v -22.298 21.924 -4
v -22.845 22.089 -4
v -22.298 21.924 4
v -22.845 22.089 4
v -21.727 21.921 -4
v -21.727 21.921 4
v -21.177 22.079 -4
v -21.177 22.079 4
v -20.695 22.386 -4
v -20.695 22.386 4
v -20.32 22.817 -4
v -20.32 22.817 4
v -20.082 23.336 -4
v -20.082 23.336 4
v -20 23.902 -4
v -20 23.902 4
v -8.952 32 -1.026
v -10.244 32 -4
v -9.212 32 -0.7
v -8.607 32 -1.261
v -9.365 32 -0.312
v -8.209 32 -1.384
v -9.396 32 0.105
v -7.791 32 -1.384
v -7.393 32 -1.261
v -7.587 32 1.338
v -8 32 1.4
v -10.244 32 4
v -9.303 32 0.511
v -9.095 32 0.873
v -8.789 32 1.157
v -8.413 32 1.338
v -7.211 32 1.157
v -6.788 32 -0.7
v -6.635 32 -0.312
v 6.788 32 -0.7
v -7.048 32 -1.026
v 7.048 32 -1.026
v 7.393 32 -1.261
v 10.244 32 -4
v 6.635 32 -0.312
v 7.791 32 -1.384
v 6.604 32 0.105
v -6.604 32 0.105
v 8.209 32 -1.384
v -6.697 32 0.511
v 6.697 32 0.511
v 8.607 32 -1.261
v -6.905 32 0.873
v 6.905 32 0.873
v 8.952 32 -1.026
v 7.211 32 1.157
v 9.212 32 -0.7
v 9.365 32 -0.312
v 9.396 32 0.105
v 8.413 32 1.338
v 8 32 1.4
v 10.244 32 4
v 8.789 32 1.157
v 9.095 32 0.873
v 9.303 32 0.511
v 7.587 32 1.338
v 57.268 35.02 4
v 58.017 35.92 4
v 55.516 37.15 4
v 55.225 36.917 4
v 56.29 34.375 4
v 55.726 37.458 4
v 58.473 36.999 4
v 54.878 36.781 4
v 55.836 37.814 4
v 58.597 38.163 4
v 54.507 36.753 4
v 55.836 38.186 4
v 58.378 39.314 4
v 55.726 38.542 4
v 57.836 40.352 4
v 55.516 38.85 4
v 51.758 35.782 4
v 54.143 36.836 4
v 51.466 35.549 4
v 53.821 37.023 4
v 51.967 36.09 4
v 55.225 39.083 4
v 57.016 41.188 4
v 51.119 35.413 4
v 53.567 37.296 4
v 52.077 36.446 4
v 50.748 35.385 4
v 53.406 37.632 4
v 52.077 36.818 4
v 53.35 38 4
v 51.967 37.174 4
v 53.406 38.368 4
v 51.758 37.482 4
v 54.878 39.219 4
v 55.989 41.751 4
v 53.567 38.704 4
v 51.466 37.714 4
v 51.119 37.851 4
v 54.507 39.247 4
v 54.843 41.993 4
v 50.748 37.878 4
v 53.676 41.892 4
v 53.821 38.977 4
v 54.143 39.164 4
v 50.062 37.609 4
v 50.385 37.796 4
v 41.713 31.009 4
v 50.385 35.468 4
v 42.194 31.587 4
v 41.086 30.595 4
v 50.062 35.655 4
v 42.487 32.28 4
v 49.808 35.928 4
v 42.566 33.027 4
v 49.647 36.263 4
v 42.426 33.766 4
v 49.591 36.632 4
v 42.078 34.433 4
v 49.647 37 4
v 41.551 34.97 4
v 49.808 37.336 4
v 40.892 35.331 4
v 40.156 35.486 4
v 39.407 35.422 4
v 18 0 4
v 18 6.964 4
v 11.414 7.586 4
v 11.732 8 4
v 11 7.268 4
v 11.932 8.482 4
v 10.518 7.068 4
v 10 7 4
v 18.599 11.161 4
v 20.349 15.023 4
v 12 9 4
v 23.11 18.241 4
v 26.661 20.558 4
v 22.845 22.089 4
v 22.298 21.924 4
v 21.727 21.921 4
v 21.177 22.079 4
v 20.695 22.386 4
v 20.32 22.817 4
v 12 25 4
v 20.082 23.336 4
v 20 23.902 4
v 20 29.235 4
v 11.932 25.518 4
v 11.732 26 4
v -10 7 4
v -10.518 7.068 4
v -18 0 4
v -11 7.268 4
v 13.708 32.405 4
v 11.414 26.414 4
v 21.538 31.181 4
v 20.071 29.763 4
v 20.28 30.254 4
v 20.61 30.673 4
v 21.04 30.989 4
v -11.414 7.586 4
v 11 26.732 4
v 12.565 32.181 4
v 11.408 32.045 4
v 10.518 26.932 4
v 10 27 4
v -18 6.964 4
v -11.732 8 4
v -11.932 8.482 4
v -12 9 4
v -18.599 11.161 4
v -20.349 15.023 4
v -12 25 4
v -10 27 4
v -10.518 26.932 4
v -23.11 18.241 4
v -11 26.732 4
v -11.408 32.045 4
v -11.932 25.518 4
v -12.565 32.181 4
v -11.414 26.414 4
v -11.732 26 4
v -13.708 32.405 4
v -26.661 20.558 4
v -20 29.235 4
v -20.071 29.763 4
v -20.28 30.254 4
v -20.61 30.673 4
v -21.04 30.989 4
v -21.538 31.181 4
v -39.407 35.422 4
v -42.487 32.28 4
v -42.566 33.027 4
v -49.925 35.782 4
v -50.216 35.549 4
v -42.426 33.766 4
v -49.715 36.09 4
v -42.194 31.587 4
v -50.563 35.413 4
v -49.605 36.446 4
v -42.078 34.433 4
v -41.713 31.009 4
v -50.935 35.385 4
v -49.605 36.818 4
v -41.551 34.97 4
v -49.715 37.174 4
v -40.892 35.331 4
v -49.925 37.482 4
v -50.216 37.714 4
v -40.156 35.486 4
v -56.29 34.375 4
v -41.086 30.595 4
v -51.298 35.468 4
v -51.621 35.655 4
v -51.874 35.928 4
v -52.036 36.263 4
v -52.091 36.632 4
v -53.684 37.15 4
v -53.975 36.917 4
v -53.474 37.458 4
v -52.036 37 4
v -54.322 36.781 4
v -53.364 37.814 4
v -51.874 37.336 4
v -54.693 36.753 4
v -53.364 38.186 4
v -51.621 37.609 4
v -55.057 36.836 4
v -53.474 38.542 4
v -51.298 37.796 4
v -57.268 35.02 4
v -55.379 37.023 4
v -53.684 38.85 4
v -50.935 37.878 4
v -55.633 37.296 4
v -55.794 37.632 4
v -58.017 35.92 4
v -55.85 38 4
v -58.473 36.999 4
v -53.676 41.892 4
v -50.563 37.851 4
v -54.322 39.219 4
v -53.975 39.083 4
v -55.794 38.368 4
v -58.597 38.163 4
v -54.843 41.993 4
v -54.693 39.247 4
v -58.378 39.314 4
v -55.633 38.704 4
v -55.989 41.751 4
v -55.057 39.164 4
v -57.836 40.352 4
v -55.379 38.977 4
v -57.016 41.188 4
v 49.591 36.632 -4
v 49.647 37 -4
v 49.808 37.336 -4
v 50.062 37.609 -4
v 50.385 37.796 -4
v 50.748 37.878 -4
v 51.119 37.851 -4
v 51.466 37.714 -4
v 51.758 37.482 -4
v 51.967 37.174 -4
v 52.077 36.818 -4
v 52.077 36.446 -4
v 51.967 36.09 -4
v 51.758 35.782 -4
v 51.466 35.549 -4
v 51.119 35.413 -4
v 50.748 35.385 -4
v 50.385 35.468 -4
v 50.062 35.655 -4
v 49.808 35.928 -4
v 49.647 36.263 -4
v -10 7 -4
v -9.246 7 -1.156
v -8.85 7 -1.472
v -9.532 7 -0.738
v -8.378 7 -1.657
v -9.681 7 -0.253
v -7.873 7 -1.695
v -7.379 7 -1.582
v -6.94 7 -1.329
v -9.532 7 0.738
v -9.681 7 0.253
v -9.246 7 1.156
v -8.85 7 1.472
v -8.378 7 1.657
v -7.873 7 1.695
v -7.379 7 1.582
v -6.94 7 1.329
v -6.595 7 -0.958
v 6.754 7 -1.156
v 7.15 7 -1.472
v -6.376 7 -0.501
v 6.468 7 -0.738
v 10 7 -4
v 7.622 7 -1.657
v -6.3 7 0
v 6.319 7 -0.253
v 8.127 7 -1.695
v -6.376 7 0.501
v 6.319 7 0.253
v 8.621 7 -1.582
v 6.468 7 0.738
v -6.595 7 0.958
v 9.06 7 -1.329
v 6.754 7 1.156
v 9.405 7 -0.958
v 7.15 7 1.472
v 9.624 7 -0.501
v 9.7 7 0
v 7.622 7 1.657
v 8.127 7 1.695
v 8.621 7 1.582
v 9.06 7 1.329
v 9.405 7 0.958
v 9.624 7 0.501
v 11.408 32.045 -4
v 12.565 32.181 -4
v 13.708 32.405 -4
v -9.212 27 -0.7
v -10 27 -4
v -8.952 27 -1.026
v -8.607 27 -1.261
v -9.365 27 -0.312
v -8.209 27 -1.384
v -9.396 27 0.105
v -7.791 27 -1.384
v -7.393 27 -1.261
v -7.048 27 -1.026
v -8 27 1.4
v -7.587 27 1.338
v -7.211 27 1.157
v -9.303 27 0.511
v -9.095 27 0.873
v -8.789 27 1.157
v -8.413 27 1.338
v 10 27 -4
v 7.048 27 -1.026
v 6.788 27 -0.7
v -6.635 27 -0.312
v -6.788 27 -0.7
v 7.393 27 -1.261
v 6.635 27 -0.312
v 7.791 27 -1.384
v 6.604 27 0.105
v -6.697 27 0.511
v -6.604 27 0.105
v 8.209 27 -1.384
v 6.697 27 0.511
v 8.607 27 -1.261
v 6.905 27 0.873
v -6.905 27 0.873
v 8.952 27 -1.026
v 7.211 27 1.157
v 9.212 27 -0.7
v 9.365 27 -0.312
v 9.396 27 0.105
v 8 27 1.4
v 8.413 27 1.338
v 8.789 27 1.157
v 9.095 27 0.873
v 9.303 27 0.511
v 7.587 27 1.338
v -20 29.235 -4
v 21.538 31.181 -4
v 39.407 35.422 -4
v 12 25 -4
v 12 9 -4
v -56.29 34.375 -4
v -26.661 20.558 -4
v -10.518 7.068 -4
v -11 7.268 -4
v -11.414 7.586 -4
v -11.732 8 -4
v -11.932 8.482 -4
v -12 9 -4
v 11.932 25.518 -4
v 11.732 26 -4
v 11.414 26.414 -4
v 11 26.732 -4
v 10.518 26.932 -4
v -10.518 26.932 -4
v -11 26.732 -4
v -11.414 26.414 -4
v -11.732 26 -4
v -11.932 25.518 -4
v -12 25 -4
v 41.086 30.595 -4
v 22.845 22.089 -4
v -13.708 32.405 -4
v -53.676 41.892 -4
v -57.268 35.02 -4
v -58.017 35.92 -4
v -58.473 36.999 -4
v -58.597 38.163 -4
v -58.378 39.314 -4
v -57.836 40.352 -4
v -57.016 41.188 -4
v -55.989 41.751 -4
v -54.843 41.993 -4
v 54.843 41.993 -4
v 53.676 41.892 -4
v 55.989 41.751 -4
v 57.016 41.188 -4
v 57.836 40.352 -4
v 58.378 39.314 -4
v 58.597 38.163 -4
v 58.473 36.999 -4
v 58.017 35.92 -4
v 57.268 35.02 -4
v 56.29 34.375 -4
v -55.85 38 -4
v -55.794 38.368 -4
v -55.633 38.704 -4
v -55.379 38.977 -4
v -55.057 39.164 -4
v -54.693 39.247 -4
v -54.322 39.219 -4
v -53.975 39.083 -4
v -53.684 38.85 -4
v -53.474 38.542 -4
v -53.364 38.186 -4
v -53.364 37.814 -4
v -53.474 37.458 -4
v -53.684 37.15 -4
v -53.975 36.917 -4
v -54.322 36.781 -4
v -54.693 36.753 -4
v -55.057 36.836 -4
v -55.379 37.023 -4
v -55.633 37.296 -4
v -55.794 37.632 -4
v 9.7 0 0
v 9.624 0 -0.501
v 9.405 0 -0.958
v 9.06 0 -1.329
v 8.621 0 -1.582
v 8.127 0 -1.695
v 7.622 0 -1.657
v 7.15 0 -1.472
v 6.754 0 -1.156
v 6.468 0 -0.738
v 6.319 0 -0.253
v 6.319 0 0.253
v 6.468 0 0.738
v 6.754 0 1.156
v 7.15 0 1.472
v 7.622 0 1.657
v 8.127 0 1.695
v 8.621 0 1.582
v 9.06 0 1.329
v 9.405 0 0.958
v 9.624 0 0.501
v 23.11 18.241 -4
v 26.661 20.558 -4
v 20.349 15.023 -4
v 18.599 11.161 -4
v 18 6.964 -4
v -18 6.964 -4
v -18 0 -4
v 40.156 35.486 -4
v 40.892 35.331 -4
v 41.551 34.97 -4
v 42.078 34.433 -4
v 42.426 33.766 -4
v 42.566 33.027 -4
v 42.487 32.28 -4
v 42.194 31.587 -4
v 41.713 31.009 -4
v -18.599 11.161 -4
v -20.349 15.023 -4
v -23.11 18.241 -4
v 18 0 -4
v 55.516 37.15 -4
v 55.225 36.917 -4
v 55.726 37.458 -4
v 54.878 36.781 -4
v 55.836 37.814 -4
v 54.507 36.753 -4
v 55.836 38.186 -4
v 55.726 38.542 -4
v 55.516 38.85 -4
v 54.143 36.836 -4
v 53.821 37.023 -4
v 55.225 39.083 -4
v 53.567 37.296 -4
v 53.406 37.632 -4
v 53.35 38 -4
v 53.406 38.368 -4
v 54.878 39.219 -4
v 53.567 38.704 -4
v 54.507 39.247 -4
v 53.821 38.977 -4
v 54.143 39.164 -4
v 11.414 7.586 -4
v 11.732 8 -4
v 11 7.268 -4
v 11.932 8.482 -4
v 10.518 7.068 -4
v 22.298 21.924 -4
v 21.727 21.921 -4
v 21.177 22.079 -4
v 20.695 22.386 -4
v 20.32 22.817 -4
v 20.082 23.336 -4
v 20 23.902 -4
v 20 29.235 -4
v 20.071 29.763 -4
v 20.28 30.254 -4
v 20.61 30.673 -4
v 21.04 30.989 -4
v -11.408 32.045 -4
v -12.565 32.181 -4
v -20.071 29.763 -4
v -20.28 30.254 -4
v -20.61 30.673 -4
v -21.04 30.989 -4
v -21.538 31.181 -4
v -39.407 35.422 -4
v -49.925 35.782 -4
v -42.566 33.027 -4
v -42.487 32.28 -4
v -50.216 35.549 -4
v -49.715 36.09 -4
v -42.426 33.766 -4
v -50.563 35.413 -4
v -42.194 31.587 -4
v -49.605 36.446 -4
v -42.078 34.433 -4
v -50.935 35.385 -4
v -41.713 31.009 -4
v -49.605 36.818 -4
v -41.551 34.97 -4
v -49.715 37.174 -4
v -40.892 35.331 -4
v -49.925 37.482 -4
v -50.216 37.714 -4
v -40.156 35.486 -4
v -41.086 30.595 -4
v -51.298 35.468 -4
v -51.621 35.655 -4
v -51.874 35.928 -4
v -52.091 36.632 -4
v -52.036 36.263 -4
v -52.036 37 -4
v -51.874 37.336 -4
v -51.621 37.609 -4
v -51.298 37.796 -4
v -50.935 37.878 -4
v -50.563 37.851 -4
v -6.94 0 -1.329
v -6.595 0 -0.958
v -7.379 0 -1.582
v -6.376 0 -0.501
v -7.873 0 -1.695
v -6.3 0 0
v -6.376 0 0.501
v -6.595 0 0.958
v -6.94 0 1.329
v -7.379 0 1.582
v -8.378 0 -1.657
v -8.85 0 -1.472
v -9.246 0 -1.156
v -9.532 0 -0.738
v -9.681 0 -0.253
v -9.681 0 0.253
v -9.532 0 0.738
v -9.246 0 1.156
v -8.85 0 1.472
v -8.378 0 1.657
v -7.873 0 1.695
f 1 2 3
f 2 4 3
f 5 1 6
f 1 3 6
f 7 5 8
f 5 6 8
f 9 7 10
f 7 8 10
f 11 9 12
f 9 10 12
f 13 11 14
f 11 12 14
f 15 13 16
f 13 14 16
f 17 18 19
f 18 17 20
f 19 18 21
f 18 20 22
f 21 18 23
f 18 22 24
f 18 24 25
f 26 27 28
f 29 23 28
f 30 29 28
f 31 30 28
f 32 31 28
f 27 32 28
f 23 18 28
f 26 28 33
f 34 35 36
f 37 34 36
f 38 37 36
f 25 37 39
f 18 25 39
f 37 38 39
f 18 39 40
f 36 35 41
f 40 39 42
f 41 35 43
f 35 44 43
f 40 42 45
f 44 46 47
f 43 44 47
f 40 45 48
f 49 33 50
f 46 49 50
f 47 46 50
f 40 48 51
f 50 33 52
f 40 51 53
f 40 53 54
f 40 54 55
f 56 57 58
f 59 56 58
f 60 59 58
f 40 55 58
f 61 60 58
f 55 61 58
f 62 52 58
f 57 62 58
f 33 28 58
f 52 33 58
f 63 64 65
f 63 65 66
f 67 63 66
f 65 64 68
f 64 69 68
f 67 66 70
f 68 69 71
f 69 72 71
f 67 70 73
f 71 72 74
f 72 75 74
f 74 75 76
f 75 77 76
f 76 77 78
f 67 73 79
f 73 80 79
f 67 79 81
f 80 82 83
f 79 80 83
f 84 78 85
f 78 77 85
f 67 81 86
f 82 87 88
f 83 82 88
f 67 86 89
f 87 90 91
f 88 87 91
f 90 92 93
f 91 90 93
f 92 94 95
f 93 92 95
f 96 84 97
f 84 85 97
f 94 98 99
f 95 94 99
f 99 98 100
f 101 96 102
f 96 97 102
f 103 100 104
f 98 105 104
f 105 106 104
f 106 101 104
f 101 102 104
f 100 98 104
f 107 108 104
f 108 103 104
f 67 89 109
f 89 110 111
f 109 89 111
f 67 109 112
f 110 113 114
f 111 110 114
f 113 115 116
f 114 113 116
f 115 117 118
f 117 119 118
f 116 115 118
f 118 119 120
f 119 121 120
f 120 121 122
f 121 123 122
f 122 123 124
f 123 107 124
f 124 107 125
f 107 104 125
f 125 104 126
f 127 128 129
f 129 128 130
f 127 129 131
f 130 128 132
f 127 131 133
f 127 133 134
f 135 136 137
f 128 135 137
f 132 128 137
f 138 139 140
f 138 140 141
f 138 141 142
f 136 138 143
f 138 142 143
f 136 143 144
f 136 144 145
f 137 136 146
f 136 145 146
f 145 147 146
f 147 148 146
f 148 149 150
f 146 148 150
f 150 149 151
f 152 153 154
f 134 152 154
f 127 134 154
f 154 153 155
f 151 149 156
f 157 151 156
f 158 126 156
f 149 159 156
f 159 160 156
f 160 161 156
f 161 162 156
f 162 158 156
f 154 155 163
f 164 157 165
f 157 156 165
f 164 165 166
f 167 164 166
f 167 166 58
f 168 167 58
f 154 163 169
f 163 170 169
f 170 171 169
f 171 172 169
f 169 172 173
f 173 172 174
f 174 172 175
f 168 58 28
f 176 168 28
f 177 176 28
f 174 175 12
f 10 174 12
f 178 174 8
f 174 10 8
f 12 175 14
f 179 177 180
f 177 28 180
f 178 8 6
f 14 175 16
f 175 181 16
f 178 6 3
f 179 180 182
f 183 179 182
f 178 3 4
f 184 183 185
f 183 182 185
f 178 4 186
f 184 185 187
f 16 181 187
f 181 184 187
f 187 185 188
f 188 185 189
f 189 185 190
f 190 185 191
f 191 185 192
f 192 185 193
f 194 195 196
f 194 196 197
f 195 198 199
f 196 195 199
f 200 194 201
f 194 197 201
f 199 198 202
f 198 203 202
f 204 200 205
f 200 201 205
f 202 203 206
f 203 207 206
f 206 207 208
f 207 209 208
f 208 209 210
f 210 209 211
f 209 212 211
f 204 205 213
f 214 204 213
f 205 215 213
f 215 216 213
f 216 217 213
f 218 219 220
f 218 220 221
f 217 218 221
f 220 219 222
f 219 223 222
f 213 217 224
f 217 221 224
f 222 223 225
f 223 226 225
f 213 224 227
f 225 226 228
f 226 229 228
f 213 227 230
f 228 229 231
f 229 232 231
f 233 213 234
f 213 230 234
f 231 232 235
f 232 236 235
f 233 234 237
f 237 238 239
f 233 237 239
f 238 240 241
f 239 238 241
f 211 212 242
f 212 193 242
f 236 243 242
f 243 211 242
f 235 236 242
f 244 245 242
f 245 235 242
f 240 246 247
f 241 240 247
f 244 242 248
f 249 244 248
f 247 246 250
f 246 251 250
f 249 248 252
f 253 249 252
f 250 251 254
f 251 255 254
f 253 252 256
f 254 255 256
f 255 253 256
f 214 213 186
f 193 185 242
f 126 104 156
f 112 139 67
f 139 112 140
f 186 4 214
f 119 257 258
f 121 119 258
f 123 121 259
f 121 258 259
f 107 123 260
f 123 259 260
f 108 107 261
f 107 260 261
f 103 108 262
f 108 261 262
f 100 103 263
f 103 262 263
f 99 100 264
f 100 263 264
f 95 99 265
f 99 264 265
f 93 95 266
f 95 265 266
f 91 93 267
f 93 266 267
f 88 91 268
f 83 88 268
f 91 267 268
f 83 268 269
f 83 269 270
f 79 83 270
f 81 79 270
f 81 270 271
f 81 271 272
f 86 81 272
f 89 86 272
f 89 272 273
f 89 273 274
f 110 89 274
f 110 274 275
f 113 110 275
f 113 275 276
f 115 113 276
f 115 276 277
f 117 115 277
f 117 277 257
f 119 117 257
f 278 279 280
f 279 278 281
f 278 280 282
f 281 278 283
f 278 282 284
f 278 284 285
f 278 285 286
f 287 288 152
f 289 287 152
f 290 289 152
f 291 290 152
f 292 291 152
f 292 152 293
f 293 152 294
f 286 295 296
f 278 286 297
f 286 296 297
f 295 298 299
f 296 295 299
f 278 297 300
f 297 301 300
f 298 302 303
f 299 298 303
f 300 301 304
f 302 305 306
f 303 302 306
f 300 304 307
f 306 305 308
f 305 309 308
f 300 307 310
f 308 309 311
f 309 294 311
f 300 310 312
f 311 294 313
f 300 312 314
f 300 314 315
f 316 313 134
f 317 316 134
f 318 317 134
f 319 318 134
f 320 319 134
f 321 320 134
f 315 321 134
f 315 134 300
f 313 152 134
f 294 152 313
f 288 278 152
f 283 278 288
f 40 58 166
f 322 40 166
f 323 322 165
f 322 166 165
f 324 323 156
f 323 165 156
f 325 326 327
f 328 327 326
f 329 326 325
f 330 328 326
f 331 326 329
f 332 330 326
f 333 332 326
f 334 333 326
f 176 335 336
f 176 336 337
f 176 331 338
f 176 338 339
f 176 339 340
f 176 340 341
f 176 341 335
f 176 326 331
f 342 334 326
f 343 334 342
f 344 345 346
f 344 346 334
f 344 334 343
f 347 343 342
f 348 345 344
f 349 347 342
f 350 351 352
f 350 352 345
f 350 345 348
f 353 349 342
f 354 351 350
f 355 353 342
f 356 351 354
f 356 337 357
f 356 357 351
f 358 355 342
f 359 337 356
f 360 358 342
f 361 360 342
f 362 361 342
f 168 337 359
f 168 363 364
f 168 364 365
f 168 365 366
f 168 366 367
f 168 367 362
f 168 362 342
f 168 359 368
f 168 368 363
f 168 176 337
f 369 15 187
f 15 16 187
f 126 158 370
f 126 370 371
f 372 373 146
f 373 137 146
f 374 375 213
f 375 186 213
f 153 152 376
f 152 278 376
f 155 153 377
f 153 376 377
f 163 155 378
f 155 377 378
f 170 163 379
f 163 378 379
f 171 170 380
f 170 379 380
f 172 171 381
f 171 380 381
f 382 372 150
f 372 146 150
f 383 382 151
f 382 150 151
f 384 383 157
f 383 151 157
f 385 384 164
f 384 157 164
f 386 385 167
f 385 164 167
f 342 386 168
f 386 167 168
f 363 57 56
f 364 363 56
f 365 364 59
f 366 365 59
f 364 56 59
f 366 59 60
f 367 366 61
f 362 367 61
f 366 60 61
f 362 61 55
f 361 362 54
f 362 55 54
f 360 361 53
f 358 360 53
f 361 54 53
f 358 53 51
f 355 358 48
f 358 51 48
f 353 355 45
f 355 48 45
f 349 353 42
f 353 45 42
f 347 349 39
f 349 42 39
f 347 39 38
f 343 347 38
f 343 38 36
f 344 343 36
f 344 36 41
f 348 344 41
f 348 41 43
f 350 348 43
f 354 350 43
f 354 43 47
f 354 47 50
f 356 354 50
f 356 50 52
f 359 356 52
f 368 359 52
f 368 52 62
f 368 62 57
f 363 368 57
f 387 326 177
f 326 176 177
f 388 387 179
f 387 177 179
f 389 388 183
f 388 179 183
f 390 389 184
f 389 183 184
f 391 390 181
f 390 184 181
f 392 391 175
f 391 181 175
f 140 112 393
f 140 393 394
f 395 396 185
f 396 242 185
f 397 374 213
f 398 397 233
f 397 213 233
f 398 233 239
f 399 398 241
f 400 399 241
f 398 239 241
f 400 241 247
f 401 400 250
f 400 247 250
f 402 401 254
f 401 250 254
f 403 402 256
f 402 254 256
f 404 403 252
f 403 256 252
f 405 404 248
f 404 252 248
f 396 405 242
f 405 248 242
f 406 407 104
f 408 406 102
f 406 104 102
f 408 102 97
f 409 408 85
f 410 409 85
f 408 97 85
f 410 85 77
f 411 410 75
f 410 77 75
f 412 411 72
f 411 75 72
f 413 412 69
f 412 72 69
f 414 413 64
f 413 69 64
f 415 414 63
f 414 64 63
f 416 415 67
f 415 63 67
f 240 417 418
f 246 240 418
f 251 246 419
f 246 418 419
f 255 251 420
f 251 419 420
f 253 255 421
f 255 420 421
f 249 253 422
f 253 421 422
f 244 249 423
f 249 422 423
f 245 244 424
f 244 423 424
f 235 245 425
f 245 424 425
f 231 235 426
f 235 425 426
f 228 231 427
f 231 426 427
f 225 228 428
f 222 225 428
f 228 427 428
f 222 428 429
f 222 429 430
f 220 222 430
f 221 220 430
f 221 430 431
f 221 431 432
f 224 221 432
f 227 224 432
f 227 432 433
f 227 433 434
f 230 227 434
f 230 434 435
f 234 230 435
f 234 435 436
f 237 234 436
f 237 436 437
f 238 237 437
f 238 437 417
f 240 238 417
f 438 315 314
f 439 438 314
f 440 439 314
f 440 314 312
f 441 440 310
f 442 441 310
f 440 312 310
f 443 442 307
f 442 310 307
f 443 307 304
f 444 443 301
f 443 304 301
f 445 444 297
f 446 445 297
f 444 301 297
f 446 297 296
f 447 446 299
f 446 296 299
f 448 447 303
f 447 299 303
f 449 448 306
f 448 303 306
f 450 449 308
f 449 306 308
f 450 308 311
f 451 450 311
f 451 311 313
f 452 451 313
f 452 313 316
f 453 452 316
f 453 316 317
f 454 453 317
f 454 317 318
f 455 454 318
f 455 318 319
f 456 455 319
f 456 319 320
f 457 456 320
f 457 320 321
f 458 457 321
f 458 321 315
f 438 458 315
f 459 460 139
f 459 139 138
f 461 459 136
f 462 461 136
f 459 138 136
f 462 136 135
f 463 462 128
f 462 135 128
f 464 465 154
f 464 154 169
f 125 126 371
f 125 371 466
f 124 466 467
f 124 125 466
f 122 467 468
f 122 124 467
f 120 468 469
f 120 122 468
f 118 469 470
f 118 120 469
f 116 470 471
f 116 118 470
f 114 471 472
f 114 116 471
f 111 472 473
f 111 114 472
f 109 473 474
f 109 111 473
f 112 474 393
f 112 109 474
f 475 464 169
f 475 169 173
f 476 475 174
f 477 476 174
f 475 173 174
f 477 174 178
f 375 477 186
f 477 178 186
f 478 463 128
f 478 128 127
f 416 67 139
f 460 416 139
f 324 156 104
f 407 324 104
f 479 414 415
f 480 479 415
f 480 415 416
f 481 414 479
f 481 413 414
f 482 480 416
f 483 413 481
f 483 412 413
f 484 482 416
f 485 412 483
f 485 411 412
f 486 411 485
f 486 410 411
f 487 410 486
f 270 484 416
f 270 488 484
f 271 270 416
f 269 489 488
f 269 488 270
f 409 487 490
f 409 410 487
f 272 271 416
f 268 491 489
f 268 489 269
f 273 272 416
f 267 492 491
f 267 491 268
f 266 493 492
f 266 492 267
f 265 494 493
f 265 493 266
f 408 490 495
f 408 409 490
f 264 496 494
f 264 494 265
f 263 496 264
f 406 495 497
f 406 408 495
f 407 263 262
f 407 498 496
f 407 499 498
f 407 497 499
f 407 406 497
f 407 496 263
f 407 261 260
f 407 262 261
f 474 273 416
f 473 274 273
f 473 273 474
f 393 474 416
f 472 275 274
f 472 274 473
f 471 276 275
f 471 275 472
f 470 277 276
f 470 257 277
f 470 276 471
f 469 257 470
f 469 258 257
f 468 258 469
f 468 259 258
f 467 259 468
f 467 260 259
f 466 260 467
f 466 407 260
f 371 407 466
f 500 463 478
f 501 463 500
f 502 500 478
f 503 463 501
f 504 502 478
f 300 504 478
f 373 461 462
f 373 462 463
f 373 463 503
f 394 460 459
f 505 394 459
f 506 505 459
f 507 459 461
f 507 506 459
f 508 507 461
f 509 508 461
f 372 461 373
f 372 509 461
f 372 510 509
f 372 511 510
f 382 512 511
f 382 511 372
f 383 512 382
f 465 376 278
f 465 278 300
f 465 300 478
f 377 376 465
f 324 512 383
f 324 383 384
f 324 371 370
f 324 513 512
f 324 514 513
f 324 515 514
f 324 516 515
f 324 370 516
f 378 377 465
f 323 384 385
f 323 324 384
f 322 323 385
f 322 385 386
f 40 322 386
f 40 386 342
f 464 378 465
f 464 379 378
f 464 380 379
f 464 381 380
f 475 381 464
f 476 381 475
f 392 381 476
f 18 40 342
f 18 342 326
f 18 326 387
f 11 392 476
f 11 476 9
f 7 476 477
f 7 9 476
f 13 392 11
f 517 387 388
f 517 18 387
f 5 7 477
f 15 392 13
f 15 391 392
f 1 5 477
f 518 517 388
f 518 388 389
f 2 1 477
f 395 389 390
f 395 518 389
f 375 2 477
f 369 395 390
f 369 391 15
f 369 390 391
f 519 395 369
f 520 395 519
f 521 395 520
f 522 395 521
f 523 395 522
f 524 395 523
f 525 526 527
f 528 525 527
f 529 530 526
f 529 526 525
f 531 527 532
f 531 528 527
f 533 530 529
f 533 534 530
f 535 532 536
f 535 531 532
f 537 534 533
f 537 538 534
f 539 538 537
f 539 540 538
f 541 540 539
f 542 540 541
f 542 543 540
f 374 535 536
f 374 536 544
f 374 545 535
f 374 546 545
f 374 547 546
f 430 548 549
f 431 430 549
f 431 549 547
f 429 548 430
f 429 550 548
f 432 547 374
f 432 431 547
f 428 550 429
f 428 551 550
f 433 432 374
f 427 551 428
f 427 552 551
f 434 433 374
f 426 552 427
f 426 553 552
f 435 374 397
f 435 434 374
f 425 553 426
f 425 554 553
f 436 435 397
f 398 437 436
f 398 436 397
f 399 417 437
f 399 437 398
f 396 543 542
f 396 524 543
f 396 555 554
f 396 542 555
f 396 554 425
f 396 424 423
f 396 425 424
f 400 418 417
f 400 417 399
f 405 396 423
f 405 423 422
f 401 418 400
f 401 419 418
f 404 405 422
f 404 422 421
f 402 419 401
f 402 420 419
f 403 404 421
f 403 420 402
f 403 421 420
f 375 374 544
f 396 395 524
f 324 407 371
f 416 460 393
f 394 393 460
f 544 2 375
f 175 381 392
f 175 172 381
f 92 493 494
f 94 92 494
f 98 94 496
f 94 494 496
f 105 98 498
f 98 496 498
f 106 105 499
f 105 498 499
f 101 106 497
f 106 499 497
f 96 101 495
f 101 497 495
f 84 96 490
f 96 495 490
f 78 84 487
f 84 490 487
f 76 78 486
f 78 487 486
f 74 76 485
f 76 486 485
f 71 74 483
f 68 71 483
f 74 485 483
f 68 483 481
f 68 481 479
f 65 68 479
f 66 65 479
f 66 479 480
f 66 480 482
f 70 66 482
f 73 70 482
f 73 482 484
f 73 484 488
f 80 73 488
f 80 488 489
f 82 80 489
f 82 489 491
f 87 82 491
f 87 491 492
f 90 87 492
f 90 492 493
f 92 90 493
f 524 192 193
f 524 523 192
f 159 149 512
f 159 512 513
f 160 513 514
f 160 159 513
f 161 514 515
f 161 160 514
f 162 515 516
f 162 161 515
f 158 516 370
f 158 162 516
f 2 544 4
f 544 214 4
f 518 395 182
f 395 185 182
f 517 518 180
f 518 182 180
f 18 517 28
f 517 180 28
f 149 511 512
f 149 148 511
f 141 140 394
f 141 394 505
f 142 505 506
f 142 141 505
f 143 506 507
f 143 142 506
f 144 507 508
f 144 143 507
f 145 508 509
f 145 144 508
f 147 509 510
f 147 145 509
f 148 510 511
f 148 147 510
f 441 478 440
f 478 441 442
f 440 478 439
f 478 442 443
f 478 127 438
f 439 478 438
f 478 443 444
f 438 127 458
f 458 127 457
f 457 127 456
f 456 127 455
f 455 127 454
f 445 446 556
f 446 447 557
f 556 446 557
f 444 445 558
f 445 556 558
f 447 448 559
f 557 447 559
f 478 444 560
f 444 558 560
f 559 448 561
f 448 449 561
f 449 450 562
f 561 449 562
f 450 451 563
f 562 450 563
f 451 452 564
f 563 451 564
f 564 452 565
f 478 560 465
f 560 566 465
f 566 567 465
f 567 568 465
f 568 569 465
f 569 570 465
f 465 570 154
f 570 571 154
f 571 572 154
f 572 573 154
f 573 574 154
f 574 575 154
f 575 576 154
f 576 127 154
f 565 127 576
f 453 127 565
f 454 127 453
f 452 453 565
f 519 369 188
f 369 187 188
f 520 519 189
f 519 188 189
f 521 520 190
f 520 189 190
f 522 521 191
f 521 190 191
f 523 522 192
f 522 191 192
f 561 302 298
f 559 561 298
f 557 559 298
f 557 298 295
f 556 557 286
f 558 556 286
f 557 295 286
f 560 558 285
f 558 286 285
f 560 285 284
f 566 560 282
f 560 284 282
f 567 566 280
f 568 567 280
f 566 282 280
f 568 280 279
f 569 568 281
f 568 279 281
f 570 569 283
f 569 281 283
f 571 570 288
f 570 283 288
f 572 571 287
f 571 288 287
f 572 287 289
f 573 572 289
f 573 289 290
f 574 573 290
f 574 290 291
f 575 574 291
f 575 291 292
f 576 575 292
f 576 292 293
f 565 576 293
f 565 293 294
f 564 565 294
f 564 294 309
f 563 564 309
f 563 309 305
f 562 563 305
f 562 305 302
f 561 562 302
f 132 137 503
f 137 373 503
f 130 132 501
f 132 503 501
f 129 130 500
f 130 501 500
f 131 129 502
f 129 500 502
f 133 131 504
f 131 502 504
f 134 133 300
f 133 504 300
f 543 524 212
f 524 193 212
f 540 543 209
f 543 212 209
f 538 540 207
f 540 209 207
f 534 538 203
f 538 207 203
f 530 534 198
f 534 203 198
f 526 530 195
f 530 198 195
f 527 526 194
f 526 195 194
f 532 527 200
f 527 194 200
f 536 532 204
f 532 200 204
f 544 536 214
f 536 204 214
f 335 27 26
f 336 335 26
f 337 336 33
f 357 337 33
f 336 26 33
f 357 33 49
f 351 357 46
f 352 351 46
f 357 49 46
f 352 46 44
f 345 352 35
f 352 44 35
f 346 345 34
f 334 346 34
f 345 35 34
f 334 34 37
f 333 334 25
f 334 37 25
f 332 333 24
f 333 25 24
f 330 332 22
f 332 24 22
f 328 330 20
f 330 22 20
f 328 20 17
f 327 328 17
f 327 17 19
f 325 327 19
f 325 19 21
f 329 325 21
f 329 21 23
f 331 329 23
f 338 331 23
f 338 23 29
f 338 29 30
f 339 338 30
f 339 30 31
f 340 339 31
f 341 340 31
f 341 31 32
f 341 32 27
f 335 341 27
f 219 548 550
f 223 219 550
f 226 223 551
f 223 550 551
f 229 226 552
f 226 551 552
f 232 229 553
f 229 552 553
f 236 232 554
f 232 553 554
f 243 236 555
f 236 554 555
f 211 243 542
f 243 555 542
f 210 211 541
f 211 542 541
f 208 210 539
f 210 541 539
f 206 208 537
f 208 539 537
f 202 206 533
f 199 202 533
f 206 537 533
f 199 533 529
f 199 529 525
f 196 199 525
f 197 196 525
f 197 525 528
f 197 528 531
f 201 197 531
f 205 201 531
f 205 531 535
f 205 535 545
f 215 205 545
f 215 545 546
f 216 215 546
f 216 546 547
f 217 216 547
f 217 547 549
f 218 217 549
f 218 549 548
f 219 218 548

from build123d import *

# Parameters (mm, degrees)
SKETCH2_R                   = 0.5
SKETCH2_W                   = 24
SKETCH2_H                   = 20
BASE_DEPTH                  = 4
FILLET1_R                   = 2
M3_CLEARANCE_HOLE1_REACH    = 70.374
M3_CLEARANCE_HOLE1_BORE_R   = 1.7
TAP_DRILL_FOR_M3X0_5_TAP1_D = 2.5
SKETCH10_R                  = 1.4
CUT_EXTRUDE1_DEPTH          = 10


with BuildPart() as part:
    # Sketch2 → Base (new, symmetric)
    with BuildSketch(Plane.XY):
        with BuildLine():
            Line((18, 0), (-18, 0))
            Line((-18, 0), (-18, 6.963574124))
            ThreePointArc((-18, 6.963574124), (-20.349128313, 15.023068249), (-26.660726074, 20.558190929))
            Line((-26.660726074, 20.558190929), (-56.290473047, 34.374768852))
            ThreePointArc((-56.290473047, 34.374768852), (-58.378054978, 39.313887584), (-53.676261446, 41.891877064))
            Line((-53.676261446, 41.891877064), (-13.708280328, 32.405461008))
            ThreePointArc((-13.708280328, 32.405461008), (-11.988094908, 32.101710083), (-10.244260752, 32))
            Line((-10.244260752, 32), (10.244260752, 32))
            ThreePointArc((10.244260752, 32), (11.988094908, 32.101710083), (13.708280328, 32.405461008))
            Line((13.708280328, 32.405461008), (53.676261446, 41.891877064))
            ThreePointArc((53.676261446, 41.891877064), (58.378054978, 39.313887584), (56.290473047, 34.374768852))
            Line((56.290473047, 34.374768852), (26.660726074, 20.558190929))
            ThreePointArc((26.660726074, 20.558190929), (20.349128313, 15.023068249), (18, 6.963574124))
            Line((18, 6.963574124), (18, 0))
        make_face()
        with Locations((-54.6, 38)):
            Circle(SKETCH2_R, mode=Mode.SUBTRACT)
        with Locations(Location((54.6, 38, 0), (0, 0, 180))):
            Circle(SKETCH2_R, mode=Mode.SUBTRACT)
        with Locations((-50.841229517, 36.631919427)):
            Circle(SKETCH2_R, mode=Mode.SUBTRACT)
        with Locations(Location((50.841229517, 36.631919427, 0), (0, 0, 180))):
            Circle(SKETCH2_R, mode=Mode.SUBTRACT)
        with Locations((0, 17)):
            Rectangle(SKETCH2_W, SKETCH2_H, mode=Mode.SUBTRACT)
        with BuildLine():
            Line((-20, 23.901748263), (-20, 29.23459547))
            ThreePointArc((-20, 29.23459547), (-20.430965495, 30.474809453), (-21.538130723, 31.180534002))
            Line((-21.538130723, 31.180534002), (-39.406838724, 35.421678882))
            ThreePointArc((-39.406838724, 35.421678882), (-42.426006691, 33.766271599), (-41.085505358, 30.594709734))
            Line((-41.085505358, 30.594709734), (-22.845236523, 22.089132689))
            ThreePointArc((-22.845236523, 22.089132689), (-20.925400783, 22.214965371), (-20, 23.901748263))
        make_face(mode=Mode.SUBTRACT)
        with BuildLine():
            Line((20, 23.901748263), (20, 29.23459547))
            ThreePointArc((20, 29.23459547), (20.430965495, 30.474809453), (21.538130723, 31.180534002))
            Line((21.538130723, 31.180534002), (39.406838724, 35.421678882))
            ThreePointArc((39.406838724, 35.421678882), (42.426006691, 33.766271599), (41.085505358, 30.594709734))
            Line((41.085505358, 30.594709734), (22.845236523, 22.089132689))
            ThreePointArc((22.845236523, 22.089132689), (20.925400783, 22.214965371), (20, 23.901748263))
        make_face(mode=Mode.SUBTRACT)
    extrude(amount=BASE_DEPTH, both=True)

    # Fillet1
    fillet1_edges = [part.edges().sort_by_distance(p)[0] for p in [
        (-12, 27, 0),
        (-12, 7, 0),
        (12, 7, 0),
        (12, 27, 0),
    ]]
    fillet(fillet1_edges, radius=FILLET1_R)

    # M3 Clearance Hole1 bore → M3 Clearance Hole1 (cut, up to next)
    with BuildSketch(Plane(origin=(0, 7, 0), x_dir=(1, 0, 0), z_dir=(0, 1, 0)), mode=Mode.PRIVATE) as m3_clearance_hole1_sk1:
        with Locations((-8, 0)):
            Circle(M3_CLEARANCE_HOLE1_BORE_R)
    m3_clearance_hole1_tool1 = extrude(m3_clearance_hole1_sk1.sketch, amount=-M3_CLEARANCE_HOLE1_REACH, mode=Mode.PRIVATE) & part.part
    # M3 Clearance Hole1 bore → M3 Clearance Hole1 (cut, up to next)
    with BuildSketch(Plane(origin=(0, 7, 0), x_dir=(1, 0, 0), z_dir=(0, 1, 0)), mode=Mode.PRIVATE) as m3_clearance_hole1_sk2:
        with Locations((8, 0)):
            Circle(M3_CLEARANCE_HOLE1_BORE_R)
    m3_clearance_hole1_tool2 = extrude(m3_clearance_hole1_sk2.sketch, amount=-M3_CLEARANCE_HOLE1_REACH, mode=Mode.PRIVATE) & part.part
    add(m3_clearance_hole1_tool1.solids().sort_by_distance((-8, 7, 0))[0], mode=Mode.SUBTRACT)
    add(m3_clearance_hole1_tool2.solids().sort_by_distance((8, 7, 0))[0], mode=Mode.SUBTRACT)

    # Tap Drill for M3x0.5 Tap1 (through all)
    with Locations(Plane.XY.offset(4)):
        with Locations((-54.6, 38), (54.6, 38), (-50.841229517, 36.631919427), (50.841229517, 36.631919427)):
            Hole(TAP_DRILL_FOR_M3X0_5_TAP1_D / 2)

    # Sketch10 → Cut-Extrude1 (cut)
    with BuildSketch(Plane(origin=(0, 32, 0), x_dir=(1, 0, 0), z_dir=(0, 1, 0))):
        with Locations(Location((-8, 0, 0), (0, 0, 270))):
            Circle(SKETCH10_R)
        with Locations(Location((8, 0, 0), (0, 0, 270))):
            Circle(SKETCH10_R)
    extrude(amount=-CUT_EXTRUDE1_DEPTH, mode=Mode.SUBTRACT)


solid = part.part
